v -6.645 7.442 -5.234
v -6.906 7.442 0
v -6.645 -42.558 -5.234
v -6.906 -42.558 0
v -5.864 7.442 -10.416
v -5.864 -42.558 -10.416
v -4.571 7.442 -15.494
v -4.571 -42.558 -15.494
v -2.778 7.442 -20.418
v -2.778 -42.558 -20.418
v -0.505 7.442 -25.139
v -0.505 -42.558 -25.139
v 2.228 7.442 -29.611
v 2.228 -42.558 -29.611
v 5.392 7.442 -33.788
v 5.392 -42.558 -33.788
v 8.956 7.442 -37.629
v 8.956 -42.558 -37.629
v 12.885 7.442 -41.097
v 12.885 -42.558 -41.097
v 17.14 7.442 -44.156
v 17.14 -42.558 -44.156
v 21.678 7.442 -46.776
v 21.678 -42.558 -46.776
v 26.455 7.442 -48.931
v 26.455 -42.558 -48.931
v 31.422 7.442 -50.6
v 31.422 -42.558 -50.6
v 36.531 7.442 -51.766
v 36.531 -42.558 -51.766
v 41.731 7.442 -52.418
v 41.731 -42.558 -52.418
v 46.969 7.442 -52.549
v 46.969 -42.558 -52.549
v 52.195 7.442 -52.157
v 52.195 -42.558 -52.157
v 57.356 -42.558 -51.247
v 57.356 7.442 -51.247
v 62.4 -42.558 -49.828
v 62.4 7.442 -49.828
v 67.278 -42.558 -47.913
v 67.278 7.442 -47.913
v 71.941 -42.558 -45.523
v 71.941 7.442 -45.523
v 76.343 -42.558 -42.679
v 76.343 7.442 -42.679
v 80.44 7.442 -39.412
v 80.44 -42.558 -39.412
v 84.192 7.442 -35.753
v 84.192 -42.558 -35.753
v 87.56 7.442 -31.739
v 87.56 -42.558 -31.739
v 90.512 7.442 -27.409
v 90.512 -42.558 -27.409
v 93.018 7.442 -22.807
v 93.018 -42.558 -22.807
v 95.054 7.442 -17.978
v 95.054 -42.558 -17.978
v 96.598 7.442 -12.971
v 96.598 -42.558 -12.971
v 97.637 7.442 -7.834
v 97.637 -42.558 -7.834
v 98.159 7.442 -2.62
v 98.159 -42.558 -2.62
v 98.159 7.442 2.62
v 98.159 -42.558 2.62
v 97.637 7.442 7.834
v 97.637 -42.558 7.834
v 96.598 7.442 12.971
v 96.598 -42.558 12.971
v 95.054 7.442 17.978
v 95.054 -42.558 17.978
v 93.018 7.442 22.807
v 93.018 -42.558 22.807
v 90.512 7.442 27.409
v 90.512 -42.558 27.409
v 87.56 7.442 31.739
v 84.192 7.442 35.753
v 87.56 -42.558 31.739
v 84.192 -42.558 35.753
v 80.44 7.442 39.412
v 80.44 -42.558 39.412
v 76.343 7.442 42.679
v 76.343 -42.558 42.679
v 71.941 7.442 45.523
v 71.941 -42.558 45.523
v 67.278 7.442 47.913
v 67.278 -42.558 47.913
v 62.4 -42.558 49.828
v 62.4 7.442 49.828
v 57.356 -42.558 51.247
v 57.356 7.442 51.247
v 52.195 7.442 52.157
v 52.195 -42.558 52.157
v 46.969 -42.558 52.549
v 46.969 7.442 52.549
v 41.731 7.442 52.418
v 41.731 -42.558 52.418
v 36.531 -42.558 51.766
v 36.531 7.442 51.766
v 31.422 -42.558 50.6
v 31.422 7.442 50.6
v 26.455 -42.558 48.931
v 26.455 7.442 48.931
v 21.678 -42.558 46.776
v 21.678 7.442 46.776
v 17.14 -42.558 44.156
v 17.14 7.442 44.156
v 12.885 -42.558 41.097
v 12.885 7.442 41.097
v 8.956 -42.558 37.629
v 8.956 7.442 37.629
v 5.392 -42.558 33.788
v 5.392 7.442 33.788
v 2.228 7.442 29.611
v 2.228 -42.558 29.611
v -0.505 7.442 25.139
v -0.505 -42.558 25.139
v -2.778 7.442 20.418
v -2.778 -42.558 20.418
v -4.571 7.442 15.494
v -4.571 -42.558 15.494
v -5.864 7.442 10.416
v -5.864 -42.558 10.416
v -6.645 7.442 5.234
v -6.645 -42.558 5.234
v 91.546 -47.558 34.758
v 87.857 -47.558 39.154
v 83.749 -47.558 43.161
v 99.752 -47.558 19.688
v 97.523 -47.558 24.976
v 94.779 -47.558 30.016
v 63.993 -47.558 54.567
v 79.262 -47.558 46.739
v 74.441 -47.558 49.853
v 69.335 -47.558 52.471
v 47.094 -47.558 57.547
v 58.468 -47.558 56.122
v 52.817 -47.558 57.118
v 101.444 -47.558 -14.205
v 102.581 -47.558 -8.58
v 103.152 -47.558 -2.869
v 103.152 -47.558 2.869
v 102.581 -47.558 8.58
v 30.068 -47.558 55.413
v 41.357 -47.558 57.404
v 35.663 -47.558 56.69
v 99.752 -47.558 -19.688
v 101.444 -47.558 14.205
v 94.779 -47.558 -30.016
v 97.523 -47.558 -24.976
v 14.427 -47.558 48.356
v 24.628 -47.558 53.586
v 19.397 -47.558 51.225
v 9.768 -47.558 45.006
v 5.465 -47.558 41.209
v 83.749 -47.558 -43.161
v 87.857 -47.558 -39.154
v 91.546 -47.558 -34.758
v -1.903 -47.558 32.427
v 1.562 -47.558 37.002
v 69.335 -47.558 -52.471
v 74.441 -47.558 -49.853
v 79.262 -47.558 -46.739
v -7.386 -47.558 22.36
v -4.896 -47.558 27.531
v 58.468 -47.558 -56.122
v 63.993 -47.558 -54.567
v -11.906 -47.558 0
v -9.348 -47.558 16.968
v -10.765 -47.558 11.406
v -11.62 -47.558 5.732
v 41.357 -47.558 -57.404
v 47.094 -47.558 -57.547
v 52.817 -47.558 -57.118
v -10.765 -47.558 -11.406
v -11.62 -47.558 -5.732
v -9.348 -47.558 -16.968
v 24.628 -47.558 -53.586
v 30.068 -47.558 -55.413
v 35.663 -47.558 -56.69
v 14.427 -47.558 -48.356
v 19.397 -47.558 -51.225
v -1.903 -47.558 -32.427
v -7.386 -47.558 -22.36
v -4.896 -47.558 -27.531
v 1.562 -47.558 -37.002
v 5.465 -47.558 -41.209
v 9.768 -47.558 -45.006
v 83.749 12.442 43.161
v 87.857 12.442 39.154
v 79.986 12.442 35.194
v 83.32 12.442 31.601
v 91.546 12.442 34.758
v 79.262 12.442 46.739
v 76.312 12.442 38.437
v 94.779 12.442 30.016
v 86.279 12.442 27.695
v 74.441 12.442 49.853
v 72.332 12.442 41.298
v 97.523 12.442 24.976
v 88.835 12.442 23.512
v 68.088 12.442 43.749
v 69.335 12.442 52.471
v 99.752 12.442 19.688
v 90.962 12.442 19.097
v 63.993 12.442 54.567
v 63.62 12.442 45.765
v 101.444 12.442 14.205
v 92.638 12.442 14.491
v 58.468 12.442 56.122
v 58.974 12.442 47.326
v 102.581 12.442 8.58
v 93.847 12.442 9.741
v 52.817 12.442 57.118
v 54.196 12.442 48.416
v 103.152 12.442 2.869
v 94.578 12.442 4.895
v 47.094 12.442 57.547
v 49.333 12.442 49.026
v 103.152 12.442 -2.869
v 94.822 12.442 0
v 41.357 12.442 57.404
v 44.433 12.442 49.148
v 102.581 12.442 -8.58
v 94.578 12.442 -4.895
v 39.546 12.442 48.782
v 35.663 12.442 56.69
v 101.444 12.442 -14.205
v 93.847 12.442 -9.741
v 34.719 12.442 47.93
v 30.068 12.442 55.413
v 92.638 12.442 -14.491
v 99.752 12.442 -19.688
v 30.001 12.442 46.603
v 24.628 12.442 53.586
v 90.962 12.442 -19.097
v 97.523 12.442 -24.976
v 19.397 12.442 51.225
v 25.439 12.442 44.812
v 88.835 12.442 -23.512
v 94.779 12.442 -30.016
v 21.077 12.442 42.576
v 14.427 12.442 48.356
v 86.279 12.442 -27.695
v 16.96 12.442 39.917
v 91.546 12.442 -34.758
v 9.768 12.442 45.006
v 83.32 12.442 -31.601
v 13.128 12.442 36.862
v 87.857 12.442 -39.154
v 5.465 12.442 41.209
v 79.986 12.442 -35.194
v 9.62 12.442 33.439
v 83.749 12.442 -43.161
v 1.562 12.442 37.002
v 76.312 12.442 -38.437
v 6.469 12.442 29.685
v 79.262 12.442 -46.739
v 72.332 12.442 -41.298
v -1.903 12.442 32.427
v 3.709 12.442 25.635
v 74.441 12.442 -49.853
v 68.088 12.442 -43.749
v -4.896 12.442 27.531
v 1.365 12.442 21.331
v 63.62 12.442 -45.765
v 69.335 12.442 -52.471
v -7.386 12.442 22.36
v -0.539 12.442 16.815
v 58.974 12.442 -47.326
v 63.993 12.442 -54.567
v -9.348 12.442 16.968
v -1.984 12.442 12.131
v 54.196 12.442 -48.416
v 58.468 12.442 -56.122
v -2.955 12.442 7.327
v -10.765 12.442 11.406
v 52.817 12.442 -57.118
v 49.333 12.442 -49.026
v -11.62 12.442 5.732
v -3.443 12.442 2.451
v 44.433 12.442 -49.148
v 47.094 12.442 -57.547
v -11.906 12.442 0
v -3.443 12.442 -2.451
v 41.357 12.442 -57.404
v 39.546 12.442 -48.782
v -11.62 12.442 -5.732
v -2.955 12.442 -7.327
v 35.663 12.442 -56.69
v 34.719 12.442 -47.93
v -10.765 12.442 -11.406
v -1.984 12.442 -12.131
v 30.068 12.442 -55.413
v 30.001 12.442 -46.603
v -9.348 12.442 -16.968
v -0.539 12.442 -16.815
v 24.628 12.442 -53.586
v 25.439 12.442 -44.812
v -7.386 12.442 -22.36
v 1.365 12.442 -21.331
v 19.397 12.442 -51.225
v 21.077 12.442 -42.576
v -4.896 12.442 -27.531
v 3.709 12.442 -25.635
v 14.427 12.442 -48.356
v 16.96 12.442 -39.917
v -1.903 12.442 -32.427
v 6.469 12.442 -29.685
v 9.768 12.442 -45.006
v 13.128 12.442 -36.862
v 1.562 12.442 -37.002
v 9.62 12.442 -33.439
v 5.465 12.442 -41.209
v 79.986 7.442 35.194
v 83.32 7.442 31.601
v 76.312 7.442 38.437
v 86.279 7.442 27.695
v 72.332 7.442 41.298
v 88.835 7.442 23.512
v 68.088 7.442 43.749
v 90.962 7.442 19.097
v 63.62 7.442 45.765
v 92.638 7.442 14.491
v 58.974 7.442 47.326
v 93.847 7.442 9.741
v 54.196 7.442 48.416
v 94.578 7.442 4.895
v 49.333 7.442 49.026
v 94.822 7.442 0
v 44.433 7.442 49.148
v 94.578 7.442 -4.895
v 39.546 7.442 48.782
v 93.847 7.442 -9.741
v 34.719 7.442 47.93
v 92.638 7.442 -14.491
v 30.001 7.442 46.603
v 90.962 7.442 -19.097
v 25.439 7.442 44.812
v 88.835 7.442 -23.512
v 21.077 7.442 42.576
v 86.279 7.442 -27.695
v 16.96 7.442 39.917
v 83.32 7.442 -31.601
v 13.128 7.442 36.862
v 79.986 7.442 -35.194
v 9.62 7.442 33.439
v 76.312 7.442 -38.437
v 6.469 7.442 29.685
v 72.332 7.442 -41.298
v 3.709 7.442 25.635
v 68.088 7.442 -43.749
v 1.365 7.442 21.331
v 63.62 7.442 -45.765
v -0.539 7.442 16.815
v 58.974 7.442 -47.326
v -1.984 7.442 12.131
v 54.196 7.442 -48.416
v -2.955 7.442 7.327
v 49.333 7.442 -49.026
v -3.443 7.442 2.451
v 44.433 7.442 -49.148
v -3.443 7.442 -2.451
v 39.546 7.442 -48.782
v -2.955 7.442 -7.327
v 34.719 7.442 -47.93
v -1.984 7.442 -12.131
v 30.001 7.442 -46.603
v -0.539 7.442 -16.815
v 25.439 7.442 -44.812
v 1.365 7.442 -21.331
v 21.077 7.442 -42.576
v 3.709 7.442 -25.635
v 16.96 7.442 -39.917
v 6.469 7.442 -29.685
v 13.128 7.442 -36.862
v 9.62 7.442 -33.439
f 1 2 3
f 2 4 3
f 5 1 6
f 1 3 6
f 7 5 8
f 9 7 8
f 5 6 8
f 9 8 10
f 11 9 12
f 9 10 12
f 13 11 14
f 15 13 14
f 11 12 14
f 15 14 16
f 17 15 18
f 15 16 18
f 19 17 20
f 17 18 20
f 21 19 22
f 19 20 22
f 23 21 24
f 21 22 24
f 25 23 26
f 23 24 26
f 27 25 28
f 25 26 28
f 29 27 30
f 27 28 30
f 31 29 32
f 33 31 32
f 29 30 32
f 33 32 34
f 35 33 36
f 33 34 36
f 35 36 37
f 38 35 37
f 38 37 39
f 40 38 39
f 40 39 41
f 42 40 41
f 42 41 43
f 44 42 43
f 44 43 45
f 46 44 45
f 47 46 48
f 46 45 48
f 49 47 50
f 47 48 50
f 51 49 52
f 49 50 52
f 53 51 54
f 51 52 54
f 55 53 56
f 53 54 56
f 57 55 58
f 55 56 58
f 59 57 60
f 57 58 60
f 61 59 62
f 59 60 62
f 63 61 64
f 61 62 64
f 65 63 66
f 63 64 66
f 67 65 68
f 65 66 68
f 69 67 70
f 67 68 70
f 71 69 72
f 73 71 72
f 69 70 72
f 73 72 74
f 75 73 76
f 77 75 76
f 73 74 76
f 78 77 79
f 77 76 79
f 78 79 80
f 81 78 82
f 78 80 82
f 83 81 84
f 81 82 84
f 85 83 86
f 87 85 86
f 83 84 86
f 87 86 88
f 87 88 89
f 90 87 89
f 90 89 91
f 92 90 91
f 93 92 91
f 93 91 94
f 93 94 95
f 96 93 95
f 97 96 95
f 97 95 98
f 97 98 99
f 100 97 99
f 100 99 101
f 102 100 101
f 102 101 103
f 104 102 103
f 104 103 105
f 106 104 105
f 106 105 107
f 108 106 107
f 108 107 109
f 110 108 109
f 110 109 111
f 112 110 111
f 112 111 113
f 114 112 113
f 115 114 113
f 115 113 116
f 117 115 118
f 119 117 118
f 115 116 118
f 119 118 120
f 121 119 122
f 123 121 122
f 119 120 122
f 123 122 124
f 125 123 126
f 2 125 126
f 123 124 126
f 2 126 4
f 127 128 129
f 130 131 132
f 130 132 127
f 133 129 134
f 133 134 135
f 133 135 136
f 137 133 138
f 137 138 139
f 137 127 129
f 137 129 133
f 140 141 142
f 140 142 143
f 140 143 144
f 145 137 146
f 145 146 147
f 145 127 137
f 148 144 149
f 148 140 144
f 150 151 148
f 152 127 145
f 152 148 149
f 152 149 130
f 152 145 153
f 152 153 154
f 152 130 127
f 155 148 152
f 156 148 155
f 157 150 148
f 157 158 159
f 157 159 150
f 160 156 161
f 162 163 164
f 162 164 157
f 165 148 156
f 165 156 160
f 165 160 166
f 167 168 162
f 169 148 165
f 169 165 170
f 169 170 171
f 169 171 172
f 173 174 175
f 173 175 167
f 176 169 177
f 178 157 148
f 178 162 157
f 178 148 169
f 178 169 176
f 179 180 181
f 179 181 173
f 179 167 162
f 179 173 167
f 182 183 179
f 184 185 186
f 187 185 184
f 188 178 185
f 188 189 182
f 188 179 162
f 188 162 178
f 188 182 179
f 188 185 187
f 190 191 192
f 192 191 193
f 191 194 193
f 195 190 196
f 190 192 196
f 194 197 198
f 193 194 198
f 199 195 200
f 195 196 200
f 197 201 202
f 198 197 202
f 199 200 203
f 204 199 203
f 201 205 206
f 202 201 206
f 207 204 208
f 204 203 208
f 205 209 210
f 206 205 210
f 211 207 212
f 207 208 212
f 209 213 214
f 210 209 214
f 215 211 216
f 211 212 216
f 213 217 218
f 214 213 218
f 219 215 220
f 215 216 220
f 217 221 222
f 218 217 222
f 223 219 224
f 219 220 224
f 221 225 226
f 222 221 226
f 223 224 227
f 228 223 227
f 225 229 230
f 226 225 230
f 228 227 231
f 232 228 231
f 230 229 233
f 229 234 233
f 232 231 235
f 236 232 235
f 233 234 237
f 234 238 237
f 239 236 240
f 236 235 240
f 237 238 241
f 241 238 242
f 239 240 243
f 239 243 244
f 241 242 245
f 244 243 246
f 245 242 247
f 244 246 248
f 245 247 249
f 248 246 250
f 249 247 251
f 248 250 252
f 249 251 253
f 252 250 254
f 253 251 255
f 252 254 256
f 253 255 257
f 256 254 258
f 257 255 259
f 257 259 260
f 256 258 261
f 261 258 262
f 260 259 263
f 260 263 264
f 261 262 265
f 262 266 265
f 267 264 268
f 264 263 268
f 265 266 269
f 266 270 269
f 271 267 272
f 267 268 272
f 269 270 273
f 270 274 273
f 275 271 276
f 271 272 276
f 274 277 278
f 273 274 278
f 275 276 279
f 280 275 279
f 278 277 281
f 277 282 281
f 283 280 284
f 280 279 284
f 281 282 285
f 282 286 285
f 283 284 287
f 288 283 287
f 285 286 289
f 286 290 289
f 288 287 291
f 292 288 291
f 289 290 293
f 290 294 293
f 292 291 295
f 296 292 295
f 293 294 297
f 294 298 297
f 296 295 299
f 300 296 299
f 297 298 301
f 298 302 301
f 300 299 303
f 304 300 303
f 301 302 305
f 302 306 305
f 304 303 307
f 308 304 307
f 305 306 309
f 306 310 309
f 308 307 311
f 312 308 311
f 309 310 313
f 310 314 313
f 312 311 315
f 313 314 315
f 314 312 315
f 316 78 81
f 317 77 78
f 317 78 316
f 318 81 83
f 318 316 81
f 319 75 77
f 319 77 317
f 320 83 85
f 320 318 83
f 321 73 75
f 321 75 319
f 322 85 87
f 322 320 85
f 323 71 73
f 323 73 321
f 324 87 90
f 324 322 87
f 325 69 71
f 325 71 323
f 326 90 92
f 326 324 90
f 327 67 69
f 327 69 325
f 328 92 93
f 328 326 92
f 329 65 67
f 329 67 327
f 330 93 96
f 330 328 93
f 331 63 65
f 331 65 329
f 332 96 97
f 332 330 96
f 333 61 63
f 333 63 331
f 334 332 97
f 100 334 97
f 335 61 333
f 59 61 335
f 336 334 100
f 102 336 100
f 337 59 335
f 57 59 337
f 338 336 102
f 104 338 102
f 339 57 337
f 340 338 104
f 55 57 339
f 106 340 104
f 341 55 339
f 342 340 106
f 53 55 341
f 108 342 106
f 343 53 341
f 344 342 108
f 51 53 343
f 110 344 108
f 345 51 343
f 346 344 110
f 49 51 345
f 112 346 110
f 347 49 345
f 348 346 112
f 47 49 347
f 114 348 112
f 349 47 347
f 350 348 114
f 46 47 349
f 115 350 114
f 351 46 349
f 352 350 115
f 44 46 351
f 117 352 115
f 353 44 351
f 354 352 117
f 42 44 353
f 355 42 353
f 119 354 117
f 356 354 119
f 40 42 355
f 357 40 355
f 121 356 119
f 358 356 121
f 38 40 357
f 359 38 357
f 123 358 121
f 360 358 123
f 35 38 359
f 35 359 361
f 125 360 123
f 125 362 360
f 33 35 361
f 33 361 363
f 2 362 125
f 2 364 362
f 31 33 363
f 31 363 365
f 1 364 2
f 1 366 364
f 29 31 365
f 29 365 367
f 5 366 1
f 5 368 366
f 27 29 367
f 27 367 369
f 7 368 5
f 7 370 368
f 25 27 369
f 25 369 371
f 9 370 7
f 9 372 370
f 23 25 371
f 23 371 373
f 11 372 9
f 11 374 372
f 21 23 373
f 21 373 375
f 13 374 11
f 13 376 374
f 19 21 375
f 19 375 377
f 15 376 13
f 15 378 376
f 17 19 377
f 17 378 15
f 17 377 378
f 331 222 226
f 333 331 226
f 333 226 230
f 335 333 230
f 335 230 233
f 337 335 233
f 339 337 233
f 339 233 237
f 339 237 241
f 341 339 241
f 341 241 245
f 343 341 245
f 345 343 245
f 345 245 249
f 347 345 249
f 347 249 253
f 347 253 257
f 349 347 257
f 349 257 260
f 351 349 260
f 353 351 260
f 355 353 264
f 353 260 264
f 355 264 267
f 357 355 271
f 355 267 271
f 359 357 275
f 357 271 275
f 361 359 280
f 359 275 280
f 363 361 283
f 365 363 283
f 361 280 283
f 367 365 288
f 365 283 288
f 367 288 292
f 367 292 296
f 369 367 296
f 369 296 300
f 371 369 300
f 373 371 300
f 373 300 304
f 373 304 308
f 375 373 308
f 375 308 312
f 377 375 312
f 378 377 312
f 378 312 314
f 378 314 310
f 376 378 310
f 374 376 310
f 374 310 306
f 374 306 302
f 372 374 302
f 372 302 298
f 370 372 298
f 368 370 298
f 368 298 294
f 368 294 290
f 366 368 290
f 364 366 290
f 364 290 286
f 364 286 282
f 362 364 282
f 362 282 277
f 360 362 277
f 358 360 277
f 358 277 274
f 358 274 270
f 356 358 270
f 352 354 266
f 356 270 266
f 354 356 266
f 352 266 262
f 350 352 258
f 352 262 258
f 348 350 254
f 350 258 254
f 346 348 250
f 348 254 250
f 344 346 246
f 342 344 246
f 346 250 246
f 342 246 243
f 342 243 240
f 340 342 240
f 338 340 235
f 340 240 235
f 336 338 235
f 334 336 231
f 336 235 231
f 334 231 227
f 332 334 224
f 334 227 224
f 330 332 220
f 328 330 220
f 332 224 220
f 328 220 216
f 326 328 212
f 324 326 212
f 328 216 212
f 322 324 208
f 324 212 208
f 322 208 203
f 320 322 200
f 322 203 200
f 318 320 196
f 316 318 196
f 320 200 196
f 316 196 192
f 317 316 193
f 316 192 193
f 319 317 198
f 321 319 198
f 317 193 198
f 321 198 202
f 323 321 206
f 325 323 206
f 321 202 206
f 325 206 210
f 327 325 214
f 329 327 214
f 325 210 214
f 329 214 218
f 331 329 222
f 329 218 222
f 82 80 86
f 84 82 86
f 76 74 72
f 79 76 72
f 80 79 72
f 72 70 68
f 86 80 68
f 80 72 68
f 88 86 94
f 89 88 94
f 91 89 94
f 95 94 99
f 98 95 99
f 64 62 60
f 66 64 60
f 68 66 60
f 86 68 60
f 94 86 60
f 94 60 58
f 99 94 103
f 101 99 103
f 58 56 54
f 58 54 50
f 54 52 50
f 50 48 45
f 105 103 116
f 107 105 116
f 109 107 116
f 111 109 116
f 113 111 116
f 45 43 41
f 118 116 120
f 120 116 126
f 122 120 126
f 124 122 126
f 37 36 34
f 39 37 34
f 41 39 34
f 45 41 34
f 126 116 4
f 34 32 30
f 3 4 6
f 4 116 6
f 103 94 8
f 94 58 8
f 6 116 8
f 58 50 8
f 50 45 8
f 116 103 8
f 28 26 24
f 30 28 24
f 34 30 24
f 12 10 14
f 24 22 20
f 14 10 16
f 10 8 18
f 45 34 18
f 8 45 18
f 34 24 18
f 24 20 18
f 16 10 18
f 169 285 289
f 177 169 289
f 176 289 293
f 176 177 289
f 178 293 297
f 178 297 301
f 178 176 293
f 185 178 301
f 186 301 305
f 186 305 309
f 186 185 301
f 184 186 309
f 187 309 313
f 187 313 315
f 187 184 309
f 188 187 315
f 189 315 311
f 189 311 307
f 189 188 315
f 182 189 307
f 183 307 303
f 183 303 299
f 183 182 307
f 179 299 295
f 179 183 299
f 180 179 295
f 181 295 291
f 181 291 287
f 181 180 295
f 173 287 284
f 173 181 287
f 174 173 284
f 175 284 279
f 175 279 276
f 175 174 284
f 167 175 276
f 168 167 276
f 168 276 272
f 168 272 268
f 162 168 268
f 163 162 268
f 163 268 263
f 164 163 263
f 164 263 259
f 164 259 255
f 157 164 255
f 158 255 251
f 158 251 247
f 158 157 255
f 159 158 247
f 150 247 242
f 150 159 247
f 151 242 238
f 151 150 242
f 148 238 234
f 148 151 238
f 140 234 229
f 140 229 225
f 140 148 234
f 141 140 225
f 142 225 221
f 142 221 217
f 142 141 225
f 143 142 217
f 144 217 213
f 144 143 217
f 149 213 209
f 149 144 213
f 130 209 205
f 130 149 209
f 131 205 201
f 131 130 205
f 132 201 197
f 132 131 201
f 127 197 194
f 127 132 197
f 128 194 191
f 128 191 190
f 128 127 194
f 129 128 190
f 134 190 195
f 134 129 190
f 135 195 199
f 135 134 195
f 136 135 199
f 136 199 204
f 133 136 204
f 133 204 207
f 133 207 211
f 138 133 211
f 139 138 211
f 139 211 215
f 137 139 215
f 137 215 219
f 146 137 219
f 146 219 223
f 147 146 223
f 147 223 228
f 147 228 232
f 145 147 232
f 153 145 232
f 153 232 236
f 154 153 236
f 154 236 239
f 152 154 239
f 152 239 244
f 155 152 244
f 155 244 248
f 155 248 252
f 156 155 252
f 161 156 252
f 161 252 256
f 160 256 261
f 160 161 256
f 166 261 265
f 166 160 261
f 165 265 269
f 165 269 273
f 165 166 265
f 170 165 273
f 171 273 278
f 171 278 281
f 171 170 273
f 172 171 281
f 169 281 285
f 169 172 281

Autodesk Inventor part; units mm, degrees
ref_plane "YZ Plane" through (0, 0, 0) normal (1, 0, 0) x (0, 1, 0)
ref_plane "XZ Plane" through (0, 0, 0) normal (0, 1, 0) x (-1, 0, 0)
ref_plane "XY Plane" through (0, 0, 0) normal (0, 0, 1) x (1, 0, 0)
sketch "Sketch1" plane through (0, 0, 0) normal (0, 0, 1) x (1, 0, 0)
  line L0 (-6.9059, 7.4416) -> (-6.9059, -42.5584)
  line L1 (-6.9059, -42.5584) -> (45.659, -42.5584)
  line L2 (45.659, -42.5584) -> (-4.341, -42.5584)
  line L3 (-6.9059, 7.4416) -> (45.659, 7.4416)
  line L4 (45.659, 7.4416) -> (45.659, -42.5584)
  point P0 (0, 0)
  dimension "d0" = 50
  dimension "d1" = 50
revolve "Revolution1" add sketch "Sketch1" angle 360 about axis through (45.659, 7.4416, 0) along (0, -1, 0)
shell "Shell1" thickness 5 outward yes removed faces 0
sketch "Sketch2" plane through (45.659, 12.4416, 0) normal (0, 1, 0) x (1, 0, 0)
  circle A0 centre (0, 0) radius 49.1631
  point P0 (-45.659, 0)
extrude "Extrusion1" cut sketch "Sketch2" against normal blind 45
equation "\"BendRadius\" = Thickness"
equation "\"BendReliefWidth\" = Thickness"
equation "\"BendReliefDepth\" = 0.5 * Thickness"
equation "\"CornerReliefSize\" = 4 * Thickness"
equation "\"MinimumRemnant\" = 2 * Thickness"
equation "\"TransitionRadius\" = BendRadius"
equation "\"JacobiRadiusSize\" = BendRadius"
equation "\"GapSize\" = Thickness"
equation "\"Thickness\" = 0.5"
properties part number "box" material "Steel, Carbon"
